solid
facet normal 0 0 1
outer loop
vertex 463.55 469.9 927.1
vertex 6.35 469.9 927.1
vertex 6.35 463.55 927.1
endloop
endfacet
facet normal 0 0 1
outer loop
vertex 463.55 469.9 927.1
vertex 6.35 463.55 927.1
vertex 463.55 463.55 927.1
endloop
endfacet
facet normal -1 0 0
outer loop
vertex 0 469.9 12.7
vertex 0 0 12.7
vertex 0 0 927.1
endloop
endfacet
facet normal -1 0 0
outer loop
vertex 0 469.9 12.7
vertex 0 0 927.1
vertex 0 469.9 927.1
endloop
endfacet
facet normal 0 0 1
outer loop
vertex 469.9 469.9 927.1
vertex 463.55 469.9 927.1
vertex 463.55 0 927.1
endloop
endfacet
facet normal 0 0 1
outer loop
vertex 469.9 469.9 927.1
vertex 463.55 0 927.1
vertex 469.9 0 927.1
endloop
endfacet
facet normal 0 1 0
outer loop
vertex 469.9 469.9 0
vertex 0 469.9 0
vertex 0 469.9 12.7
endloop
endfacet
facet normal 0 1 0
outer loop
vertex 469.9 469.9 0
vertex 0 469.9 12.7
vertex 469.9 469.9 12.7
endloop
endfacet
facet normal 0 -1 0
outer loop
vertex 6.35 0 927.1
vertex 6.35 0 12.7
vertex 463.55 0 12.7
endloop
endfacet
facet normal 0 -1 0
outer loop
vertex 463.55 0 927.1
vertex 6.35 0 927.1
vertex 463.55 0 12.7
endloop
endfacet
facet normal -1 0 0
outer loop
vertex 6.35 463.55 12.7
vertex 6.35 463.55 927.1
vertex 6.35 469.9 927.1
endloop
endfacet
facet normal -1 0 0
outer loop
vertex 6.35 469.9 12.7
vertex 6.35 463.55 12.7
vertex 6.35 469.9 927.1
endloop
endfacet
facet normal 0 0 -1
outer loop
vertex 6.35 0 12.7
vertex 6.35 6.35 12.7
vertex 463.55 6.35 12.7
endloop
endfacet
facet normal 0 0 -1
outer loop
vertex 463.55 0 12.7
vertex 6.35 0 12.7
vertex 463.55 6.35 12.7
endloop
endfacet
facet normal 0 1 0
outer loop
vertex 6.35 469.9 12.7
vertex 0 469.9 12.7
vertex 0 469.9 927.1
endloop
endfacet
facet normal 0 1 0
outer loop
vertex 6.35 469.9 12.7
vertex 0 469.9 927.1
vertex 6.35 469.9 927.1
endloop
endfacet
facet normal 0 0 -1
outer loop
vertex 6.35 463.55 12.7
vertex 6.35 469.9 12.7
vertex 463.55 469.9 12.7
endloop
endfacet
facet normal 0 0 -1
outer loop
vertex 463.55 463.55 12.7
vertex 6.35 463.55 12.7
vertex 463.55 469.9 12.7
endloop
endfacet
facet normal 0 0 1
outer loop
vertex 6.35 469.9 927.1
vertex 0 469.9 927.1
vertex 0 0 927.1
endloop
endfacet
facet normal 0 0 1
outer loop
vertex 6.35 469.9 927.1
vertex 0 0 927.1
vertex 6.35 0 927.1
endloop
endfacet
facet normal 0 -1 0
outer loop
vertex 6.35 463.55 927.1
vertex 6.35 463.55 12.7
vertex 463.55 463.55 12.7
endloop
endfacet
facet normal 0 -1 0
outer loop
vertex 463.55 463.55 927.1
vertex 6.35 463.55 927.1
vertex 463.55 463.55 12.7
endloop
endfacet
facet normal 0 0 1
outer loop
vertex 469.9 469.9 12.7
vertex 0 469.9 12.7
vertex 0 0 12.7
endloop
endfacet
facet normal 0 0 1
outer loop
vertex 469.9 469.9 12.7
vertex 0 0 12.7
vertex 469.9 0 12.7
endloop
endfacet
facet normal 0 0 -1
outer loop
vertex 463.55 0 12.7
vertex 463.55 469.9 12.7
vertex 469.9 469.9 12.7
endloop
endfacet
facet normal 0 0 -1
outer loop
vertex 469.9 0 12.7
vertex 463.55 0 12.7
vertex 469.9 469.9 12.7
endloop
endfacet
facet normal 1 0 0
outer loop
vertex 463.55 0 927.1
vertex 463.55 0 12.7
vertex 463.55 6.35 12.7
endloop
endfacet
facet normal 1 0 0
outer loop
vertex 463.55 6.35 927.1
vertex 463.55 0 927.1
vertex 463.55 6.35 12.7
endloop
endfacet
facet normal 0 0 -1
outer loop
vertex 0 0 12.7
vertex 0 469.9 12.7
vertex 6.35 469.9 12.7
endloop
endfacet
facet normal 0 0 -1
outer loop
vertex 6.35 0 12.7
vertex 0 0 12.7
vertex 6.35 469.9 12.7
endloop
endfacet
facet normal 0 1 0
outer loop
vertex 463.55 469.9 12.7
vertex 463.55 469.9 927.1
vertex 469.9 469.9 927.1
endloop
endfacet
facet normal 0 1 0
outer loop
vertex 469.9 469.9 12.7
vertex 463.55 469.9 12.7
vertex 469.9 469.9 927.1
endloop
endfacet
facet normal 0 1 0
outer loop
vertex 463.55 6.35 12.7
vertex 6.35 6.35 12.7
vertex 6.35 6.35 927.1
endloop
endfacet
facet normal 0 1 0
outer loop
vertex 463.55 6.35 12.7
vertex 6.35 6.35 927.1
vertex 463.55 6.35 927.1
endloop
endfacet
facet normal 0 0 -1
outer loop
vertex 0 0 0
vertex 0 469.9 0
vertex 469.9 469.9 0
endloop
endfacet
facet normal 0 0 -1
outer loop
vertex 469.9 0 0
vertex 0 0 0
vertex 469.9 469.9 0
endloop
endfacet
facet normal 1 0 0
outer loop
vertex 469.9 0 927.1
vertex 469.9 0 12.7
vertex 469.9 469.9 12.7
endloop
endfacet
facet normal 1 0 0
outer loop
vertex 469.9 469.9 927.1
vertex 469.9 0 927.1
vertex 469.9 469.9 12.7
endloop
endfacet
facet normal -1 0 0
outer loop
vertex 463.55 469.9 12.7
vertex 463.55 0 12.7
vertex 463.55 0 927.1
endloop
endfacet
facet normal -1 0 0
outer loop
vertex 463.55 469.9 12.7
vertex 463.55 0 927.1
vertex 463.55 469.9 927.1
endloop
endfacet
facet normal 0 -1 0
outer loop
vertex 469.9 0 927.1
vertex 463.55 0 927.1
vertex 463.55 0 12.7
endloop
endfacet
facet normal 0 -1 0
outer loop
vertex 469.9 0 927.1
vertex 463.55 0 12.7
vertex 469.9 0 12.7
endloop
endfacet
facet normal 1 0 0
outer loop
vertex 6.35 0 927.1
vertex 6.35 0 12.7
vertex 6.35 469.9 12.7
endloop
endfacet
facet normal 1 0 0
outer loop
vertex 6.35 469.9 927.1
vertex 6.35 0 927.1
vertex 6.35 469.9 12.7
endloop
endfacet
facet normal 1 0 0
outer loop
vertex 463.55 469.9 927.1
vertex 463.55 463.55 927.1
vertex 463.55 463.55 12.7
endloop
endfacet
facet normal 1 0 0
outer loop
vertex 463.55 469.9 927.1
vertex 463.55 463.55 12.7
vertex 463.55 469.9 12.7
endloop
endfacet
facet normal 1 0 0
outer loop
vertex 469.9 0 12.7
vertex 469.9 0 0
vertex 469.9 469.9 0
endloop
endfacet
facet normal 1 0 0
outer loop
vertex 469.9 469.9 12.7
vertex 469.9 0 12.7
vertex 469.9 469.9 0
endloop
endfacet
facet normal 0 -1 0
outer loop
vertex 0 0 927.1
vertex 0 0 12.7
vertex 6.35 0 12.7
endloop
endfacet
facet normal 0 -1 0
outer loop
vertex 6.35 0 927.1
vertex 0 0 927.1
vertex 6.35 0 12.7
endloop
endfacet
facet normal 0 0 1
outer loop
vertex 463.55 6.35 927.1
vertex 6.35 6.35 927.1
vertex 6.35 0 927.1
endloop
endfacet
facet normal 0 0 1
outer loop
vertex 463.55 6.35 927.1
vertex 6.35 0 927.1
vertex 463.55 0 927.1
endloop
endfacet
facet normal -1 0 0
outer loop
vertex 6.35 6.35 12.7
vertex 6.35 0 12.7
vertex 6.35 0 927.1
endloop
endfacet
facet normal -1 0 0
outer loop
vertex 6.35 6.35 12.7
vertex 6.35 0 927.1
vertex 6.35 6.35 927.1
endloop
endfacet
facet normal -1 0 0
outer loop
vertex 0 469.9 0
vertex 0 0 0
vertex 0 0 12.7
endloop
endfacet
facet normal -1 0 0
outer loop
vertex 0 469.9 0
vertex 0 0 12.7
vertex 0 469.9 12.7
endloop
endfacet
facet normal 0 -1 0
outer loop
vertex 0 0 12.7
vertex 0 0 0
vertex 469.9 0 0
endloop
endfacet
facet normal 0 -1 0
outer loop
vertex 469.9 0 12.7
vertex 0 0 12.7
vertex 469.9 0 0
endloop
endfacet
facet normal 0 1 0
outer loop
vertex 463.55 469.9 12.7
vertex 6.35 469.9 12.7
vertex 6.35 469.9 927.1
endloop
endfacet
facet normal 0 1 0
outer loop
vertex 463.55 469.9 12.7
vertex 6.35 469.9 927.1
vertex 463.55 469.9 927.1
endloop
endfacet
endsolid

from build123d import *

# Parameters (mm, degrees)
F0_W     = 469.9
F0_H     = 469.9
F1_DEPTH = 12.7
F5_W     = 457.2
F5_H     = 6.35
F6_DEPTH = 914.4
F2_W     = 6.35
F2_H     = 469.9
F3_W     = 6.35
F3_H     = 469.9
F4_W     = 457.2
F4_H     = 6.35


# Not quite as in the source:
# - a length typed as a fraction of an inch, garbled in the dataset ("3 / 203.2 mm" for 3/8 in), is restored


with BuildPart() as f1:
    # F0 (on Top) → F1 (new body)
    with BuildSketch(Plane.XY):
        with Locations((234.95, 234.95)):
            Rectangle(F0_W, F0_H)
    extrude(amount=F1_DEPTH)


with BuildPart() as f6:
    # F5 (on face) → F6 (new body)
    with BuildSketch(Plane.XY.offset(12.7)):
        with Locations((234.95, 3.175)):
            Rectangle(F5_W, F5_H)
    extrude(amount=F6_DEPTH)


with BuildPart() as f6b:
    # F2 (on face) → F6, piece 2 (new body)
    with BuildSketch(Plane.XY.offset(12.7)):
        with Locations((3.175, 234.95)):
            Rectangle(F2_W, F2_H)
    extrude(amount=F6_DEPTH)


with BuildPart() as f6c:
    # F3 (on face) → F6, piece 3 (new body)
    with BuildSketch(Plane.XY.offset(12.7)):
        with Locations((466.725, 234.95)):
            Rectangle(F3_W, F3_H)
    extrude(amount=F6_DEPTH)


with BuildPart() as f6d:
    # F4 (on face) → F6, piece 4 (new body)
    with BuildSketch(Plane.XY.offset(12.7)):
        with Locations((234.95, 466.725)):
            Rectangle(F4_W, F4_H)
    extrude(amount=F6_DEPTH)


solid = Compound([f1.part, f6.part, f6b.part, f6c.part, f6d.part])
